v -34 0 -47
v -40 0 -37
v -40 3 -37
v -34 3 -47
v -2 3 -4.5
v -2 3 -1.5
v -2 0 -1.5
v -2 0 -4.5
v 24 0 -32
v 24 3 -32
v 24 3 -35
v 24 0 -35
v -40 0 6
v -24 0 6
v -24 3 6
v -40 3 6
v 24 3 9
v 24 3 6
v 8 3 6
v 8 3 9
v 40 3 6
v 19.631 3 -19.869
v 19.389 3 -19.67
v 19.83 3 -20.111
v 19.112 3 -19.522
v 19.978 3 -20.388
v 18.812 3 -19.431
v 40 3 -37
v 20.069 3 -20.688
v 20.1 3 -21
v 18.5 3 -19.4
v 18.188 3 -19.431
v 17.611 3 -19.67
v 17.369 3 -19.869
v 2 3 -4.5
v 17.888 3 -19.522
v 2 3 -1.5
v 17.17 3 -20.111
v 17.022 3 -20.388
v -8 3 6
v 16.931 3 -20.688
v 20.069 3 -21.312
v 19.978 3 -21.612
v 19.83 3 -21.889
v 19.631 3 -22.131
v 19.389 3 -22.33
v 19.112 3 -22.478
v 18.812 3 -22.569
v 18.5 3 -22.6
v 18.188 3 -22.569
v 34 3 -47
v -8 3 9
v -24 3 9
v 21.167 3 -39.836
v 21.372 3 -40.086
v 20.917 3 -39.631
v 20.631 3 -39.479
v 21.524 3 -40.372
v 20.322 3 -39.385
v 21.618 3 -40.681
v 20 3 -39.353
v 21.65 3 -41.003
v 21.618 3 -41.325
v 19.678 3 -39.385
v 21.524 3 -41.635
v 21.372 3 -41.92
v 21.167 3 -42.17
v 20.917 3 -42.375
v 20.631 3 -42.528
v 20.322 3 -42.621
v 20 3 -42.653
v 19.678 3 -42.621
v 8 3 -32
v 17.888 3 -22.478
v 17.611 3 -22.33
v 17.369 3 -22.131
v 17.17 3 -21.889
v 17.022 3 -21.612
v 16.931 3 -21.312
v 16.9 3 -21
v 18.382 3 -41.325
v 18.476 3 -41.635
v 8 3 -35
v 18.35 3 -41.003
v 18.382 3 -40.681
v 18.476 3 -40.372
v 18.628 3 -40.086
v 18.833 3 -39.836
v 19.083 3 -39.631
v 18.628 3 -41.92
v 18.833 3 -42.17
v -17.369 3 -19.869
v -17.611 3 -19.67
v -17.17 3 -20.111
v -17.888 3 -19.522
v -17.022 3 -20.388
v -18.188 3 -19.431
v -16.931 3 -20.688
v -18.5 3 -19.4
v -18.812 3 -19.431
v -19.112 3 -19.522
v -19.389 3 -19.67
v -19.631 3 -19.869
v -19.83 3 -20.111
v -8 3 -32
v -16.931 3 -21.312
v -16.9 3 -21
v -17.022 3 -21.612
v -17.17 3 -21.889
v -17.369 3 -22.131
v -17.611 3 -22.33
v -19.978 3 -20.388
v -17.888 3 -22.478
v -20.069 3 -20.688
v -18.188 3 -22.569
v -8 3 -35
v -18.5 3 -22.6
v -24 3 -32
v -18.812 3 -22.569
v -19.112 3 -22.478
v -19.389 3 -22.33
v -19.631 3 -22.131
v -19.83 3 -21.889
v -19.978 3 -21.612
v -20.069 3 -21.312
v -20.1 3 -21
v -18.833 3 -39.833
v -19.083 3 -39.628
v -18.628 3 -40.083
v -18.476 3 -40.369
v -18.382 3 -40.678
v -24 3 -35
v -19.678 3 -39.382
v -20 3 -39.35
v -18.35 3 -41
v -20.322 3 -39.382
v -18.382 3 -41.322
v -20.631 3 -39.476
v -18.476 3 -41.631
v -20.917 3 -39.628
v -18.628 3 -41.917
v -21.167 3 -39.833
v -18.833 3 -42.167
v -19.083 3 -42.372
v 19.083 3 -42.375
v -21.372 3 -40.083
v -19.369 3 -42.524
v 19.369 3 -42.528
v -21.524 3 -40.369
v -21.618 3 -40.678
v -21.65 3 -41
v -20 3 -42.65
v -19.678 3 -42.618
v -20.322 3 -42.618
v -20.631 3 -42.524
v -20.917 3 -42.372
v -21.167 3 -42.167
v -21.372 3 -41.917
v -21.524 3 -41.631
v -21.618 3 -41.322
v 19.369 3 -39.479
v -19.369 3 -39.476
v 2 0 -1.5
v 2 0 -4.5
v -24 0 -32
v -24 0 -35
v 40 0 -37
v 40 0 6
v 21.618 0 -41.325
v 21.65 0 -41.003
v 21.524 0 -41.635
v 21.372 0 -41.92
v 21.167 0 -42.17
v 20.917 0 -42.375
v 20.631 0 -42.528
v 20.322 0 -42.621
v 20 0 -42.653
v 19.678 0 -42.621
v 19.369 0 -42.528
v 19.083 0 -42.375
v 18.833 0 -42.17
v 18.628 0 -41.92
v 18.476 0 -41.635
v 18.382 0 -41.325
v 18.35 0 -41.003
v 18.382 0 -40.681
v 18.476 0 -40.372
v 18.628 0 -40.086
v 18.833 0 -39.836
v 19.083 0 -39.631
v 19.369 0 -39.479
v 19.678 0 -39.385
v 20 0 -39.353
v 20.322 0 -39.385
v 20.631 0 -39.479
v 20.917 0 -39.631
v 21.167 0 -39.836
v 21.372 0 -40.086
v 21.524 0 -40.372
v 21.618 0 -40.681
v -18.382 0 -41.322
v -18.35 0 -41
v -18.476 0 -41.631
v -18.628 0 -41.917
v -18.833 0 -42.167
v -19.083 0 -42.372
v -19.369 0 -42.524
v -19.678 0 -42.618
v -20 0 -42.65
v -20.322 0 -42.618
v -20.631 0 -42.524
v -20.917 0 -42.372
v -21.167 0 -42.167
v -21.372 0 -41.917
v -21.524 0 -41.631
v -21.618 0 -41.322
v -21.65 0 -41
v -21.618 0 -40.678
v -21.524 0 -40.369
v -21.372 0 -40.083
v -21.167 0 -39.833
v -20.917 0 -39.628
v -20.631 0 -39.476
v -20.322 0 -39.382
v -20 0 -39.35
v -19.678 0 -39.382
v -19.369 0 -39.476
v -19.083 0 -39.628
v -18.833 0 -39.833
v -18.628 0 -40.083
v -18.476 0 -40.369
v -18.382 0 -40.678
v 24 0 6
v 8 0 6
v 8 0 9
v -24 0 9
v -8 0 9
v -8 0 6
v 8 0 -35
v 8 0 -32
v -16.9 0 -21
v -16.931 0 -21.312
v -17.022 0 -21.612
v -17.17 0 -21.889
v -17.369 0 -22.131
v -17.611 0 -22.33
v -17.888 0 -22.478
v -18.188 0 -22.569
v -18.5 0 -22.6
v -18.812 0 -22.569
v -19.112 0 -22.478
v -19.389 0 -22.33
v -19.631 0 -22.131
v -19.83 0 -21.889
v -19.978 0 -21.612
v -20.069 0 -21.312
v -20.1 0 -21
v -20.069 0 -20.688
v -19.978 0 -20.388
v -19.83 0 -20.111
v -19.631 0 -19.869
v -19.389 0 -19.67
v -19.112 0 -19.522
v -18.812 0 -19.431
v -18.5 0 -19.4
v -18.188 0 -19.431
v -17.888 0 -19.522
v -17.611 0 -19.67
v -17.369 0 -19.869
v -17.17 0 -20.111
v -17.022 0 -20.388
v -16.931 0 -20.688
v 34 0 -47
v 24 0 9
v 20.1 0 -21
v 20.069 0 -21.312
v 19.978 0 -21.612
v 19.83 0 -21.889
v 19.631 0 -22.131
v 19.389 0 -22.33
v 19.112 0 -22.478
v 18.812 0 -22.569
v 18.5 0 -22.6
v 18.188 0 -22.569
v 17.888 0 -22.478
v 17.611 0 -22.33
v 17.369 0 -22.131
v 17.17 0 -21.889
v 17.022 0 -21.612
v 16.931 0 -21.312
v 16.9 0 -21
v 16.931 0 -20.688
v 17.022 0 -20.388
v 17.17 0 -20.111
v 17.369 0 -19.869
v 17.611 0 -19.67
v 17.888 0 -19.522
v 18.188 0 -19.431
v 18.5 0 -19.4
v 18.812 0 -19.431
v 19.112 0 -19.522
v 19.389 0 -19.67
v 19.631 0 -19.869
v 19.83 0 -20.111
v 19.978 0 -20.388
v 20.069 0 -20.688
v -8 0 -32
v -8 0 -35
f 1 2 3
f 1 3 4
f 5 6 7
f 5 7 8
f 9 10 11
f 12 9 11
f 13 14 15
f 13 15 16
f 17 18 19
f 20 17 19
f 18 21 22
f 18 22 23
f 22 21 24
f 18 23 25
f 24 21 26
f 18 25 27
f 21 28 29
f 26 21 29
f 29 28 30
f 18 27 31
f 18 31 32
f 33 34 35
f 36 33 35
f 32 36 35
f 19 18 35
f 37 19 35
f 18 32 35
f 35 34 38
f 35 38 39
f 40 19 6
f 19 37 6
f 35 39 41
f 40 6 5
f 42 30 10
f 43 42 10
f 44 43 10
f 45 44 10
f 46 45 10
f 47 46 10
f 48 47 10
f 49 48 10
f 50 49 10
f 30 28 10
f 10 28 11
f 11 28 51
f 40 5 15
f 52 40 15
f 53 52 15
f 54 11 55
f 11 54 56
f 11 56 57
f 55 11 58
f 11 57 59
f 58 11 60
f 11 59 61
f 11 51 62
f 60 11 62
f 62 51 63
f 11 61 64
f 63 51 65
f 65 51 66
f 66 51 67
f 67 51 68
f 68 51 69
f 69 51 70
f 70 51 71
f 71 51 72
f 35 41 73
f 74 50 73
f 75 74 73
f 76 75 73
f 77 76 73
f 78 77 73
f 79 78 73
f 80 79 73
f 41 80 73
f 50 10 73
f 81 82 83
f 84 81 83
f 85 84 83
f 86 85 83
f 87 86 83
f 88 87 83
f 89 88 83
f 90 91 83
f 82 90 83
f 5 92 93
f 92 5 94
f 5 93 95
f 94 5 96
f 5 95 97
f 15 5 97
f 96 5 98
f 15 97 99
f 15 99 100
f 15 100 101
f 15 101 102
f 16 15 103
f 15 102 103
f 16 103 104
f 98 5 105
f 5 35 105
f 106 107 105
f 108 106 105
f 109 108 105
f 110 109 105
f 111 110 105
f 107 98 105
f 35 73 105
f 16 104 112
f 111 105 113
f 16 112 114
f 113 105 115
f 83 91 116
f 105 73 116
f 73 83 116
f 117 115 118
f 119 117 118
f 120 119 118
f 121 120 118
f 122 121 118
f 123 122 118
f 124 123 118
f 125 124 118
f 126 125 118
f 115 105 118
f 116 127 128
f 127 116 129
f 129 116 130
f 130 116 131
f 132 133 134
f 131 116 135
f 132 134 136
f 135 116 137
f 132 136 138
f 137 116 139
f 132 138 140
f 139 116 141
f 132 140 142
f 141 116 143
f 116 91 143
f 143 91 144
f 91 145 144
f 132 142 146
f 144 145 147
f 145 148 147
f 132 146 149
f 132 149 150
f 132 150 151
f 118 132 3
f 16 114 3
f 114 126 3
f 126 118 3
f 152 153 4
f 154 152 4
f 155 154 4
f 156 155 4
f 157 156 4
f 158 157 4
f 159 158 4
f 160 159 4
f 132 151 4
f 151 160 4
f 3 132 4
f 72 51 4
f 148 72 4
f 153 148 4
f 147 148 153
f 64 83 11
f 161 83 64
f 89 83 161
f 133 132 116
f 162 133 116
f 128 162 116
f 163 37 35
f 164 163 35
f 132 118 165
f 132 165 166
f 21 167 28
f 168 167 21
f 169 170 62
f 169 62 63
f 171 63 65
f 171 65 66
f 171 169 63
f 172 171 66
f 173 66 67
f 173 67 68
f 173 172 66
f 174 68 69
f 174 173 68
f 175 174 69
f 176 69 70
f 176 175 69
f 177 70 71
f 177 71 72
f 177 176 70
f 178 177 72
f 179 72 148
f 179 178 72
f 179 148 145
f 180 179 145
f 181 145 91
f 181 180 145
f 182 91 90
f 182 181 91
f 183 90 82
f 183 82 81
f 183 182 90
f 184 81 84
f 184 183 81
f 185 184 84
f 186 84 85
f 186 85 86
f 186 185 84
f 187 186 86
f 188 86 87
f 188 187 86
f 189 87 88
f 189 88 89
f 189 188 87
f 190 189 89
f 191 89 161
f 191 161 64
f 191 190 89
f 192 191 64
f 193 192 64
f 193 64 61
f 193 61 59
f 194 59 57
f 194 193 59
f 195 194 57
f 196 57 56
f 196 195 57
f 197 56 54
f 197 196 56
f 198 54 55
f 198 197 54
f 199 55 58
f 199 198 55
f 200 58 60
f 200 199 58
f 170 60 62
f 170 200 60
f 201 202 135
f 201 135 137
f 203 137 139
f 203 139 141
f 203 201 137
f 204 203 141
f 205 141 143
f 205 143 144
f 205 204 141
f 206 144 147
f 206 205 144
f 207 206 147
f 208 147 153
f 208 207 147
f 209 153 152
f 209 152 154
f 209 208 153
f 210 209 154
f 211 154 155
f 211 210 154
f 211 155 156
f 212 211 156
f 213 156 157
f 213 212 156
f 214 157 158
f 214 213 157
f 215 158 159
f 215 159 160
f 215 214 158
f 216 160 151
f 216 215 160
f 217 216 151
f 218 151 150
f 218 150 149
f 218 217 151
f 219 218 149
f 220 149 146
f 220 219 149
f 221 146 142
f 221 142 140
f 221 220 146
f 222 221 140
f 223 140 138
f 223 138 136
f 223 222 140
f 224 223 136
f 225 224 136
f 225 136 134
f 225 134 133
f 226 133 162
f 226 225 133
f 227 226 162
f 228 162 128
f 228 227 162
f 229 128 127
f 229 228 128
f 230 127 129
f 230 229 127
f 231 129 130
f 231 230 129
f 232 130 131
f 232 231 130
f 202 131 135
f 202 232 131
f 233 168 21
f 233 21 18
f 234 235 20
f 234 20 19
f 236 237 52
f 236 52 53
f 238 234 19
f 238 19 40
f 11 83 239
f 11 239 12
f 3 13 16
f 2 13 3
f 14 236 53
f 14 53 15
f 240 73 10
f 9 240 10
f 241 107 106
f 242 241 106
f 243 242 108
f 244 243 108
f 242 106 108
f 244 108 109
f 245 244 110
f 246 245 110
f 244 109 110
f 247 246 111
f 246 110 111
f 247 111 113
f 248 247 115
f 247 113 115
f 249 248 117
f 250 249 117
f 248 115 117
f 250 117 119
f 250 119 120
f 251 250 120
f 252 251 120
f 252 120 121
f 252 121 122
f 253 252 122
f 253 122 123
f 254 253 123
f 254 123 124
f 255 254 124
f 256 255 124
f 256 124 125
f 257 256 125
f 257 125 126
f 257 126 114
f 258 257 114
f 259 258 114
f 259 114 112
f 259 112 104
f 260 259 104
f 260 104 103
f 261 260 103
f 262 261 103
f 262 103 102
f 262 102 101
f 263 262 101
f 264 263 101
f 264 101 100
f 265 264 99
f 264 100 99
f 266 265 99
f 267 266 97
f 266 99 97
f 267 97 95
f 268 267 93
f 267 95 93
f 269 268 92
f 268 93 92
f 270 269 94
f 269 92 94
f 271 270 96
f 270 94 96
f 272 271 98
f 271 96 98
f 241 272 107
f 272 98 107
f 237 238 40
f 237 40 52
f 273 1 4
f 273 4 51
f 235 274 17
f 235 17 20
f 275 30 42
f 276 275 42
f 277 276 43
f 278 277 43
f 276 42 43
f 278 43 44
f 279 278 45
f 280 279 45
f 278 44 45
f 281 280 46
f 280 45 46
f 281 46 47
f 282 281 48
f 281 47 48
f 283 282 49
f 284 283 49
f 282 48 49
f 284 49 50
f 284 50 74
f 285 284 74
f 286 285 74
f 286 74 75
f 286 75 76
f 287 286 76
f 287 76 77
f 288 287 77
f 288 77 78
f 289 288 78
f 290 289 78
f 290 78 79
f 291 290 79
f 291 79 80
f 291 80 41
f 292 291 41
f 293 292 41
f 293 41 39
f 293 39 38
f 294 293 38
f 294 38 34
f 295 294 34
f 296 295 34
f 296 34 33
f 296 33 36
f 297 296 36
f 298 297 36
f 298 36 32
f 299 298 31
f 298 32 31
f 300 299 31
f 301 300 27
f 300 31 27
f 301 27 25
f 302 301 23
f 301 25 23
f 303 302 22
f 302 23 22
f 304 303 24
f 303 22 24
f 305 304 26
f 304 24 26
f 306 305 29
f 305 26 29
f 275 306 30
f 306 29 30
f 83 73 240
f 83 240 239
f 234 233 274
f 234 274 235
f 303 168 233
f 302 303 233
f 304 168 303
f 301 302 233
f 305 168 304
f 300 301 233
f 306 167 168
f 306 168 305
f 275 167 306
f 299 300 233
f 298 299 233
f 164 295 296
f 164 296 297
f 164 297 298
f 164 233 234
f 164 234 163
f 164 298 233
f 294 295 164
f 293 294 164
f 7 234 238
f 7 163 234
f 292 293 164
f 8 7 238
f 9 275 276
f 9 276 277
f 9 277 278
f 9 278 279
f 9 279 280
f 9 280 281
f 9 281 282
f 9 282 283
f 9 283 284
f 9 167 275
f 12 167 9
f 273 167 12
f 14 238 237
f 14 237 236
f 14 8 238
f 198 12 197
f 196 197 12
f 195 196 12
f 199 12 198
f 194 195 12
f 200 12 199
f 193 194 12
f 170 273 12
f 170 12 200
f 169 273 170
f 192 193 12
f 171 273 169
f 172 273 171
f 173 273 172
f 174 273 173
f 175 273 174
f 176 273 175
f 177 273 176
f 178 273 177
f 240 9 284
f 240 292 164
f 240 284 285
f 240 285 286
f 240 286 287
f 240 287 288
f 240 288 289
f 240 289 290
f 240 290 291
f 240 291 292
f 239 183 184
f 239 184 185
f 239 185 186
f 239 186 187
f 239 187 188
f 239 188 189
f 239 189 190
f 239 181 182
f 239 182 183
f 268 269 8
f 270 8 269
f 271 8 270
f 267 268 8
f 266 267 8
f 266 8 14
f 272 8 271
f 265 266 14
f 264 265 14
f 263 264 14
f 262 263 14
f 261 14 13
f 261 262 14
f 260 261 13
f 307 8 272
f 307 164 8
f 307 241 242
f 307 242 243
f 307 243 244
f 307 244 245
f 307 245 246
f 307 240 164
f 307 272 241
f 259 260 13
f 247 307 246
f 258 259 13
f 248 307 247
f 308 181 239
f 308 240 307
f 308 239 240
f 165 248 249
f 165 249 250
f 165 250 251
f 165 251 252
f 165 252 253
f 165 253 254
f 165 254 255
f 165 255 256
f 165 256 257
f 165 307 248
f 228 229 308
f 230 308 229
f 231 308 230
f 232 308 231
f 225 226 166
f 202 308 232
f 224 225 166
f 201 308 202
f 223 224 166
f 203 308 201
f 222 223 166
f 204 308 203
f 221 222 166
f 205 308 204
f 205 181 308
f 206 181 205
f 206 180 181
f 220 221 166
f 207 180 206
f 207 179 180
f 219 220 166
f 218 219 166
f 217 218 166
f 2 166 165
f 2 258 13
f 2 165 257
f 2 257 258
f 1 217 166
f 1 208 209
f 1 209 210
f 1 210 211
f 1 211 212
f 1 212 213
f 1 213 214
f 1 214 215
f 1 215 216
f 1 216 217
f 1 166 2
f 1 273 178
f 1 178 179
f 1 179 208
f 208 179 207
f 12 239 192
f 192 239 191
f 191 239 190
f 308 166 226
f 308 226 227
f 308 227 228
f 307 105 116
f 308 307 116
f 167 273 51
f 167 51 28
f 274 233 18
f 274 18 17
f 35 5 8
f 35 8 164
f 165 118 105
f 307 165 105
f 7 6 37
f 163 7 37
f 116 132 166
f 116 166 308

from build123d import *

# Parameters (mm, degrees)
SKETCH1_R           = 1.65
BOSS_EXTRUDE1_DEPTH = 3
SKETCH2_R           = 1.6
SKETCH2_W           = 4
SKETCH2_H           = 3
SKETCH2_W_2         = 16
CUT_EXTRUDE1_DEPTH  = 4


with BuildPart() as part:
    # Sketch1 → Boss-Extrude1 (new body)
    with BuildSketch(Plane(origin=(0, 0, 0), x_dir=(1, 0, 0), z_dir=(0, 1, 0))):
        Polygon((-40, 37), (-34, 47), (34, 47), (40, 37), (40, -6), (24, -6), (24, -9), (8, -9), (8, -6), (-8, -6), (-8, -9), (-24, -9), (-24, -6), (-40, -6), align=None)
        with Locations((-20, 41)):
            Circle(SKETCH1_R, mode=Mode.SUBTRACT)
        with Locations((20, 41.003103662)):
            Circle(SKETCH1_R, mode=Mode.SUBTRACT)
    extrude(amount=BOSS_EXTRUDE1_DEPTH)

    # Sketch2 → Cut-Extrude1 (cut, through all)
    with BuildSketch(Plane(origin=(0, 3, 0), x_dir=(1, 0, 0), z_dir=(0, 1, 0))):
        with Locations((-18.5, 21)):
            Circle(SKETCH2_R)
        with Locations((18.5, 21)):
            Circle(SKETCH2_R)
        with Locations((0, 3)):
            Rectangle(SKETCH2_W, SKETCH2_H)
        with Locations((-16, 33.5)):
            Rectangle(SKETCH2_W_2, SKETCH2_H)
        with Locations((16, 33.5)):
            Rectangle(SKETCH2_W_2, SKETCH2_H)
    extrude(amount=-CUT_EXTRUDE1_DEPTH, mode=Mode.SUBTRACT)


solid = part.part
